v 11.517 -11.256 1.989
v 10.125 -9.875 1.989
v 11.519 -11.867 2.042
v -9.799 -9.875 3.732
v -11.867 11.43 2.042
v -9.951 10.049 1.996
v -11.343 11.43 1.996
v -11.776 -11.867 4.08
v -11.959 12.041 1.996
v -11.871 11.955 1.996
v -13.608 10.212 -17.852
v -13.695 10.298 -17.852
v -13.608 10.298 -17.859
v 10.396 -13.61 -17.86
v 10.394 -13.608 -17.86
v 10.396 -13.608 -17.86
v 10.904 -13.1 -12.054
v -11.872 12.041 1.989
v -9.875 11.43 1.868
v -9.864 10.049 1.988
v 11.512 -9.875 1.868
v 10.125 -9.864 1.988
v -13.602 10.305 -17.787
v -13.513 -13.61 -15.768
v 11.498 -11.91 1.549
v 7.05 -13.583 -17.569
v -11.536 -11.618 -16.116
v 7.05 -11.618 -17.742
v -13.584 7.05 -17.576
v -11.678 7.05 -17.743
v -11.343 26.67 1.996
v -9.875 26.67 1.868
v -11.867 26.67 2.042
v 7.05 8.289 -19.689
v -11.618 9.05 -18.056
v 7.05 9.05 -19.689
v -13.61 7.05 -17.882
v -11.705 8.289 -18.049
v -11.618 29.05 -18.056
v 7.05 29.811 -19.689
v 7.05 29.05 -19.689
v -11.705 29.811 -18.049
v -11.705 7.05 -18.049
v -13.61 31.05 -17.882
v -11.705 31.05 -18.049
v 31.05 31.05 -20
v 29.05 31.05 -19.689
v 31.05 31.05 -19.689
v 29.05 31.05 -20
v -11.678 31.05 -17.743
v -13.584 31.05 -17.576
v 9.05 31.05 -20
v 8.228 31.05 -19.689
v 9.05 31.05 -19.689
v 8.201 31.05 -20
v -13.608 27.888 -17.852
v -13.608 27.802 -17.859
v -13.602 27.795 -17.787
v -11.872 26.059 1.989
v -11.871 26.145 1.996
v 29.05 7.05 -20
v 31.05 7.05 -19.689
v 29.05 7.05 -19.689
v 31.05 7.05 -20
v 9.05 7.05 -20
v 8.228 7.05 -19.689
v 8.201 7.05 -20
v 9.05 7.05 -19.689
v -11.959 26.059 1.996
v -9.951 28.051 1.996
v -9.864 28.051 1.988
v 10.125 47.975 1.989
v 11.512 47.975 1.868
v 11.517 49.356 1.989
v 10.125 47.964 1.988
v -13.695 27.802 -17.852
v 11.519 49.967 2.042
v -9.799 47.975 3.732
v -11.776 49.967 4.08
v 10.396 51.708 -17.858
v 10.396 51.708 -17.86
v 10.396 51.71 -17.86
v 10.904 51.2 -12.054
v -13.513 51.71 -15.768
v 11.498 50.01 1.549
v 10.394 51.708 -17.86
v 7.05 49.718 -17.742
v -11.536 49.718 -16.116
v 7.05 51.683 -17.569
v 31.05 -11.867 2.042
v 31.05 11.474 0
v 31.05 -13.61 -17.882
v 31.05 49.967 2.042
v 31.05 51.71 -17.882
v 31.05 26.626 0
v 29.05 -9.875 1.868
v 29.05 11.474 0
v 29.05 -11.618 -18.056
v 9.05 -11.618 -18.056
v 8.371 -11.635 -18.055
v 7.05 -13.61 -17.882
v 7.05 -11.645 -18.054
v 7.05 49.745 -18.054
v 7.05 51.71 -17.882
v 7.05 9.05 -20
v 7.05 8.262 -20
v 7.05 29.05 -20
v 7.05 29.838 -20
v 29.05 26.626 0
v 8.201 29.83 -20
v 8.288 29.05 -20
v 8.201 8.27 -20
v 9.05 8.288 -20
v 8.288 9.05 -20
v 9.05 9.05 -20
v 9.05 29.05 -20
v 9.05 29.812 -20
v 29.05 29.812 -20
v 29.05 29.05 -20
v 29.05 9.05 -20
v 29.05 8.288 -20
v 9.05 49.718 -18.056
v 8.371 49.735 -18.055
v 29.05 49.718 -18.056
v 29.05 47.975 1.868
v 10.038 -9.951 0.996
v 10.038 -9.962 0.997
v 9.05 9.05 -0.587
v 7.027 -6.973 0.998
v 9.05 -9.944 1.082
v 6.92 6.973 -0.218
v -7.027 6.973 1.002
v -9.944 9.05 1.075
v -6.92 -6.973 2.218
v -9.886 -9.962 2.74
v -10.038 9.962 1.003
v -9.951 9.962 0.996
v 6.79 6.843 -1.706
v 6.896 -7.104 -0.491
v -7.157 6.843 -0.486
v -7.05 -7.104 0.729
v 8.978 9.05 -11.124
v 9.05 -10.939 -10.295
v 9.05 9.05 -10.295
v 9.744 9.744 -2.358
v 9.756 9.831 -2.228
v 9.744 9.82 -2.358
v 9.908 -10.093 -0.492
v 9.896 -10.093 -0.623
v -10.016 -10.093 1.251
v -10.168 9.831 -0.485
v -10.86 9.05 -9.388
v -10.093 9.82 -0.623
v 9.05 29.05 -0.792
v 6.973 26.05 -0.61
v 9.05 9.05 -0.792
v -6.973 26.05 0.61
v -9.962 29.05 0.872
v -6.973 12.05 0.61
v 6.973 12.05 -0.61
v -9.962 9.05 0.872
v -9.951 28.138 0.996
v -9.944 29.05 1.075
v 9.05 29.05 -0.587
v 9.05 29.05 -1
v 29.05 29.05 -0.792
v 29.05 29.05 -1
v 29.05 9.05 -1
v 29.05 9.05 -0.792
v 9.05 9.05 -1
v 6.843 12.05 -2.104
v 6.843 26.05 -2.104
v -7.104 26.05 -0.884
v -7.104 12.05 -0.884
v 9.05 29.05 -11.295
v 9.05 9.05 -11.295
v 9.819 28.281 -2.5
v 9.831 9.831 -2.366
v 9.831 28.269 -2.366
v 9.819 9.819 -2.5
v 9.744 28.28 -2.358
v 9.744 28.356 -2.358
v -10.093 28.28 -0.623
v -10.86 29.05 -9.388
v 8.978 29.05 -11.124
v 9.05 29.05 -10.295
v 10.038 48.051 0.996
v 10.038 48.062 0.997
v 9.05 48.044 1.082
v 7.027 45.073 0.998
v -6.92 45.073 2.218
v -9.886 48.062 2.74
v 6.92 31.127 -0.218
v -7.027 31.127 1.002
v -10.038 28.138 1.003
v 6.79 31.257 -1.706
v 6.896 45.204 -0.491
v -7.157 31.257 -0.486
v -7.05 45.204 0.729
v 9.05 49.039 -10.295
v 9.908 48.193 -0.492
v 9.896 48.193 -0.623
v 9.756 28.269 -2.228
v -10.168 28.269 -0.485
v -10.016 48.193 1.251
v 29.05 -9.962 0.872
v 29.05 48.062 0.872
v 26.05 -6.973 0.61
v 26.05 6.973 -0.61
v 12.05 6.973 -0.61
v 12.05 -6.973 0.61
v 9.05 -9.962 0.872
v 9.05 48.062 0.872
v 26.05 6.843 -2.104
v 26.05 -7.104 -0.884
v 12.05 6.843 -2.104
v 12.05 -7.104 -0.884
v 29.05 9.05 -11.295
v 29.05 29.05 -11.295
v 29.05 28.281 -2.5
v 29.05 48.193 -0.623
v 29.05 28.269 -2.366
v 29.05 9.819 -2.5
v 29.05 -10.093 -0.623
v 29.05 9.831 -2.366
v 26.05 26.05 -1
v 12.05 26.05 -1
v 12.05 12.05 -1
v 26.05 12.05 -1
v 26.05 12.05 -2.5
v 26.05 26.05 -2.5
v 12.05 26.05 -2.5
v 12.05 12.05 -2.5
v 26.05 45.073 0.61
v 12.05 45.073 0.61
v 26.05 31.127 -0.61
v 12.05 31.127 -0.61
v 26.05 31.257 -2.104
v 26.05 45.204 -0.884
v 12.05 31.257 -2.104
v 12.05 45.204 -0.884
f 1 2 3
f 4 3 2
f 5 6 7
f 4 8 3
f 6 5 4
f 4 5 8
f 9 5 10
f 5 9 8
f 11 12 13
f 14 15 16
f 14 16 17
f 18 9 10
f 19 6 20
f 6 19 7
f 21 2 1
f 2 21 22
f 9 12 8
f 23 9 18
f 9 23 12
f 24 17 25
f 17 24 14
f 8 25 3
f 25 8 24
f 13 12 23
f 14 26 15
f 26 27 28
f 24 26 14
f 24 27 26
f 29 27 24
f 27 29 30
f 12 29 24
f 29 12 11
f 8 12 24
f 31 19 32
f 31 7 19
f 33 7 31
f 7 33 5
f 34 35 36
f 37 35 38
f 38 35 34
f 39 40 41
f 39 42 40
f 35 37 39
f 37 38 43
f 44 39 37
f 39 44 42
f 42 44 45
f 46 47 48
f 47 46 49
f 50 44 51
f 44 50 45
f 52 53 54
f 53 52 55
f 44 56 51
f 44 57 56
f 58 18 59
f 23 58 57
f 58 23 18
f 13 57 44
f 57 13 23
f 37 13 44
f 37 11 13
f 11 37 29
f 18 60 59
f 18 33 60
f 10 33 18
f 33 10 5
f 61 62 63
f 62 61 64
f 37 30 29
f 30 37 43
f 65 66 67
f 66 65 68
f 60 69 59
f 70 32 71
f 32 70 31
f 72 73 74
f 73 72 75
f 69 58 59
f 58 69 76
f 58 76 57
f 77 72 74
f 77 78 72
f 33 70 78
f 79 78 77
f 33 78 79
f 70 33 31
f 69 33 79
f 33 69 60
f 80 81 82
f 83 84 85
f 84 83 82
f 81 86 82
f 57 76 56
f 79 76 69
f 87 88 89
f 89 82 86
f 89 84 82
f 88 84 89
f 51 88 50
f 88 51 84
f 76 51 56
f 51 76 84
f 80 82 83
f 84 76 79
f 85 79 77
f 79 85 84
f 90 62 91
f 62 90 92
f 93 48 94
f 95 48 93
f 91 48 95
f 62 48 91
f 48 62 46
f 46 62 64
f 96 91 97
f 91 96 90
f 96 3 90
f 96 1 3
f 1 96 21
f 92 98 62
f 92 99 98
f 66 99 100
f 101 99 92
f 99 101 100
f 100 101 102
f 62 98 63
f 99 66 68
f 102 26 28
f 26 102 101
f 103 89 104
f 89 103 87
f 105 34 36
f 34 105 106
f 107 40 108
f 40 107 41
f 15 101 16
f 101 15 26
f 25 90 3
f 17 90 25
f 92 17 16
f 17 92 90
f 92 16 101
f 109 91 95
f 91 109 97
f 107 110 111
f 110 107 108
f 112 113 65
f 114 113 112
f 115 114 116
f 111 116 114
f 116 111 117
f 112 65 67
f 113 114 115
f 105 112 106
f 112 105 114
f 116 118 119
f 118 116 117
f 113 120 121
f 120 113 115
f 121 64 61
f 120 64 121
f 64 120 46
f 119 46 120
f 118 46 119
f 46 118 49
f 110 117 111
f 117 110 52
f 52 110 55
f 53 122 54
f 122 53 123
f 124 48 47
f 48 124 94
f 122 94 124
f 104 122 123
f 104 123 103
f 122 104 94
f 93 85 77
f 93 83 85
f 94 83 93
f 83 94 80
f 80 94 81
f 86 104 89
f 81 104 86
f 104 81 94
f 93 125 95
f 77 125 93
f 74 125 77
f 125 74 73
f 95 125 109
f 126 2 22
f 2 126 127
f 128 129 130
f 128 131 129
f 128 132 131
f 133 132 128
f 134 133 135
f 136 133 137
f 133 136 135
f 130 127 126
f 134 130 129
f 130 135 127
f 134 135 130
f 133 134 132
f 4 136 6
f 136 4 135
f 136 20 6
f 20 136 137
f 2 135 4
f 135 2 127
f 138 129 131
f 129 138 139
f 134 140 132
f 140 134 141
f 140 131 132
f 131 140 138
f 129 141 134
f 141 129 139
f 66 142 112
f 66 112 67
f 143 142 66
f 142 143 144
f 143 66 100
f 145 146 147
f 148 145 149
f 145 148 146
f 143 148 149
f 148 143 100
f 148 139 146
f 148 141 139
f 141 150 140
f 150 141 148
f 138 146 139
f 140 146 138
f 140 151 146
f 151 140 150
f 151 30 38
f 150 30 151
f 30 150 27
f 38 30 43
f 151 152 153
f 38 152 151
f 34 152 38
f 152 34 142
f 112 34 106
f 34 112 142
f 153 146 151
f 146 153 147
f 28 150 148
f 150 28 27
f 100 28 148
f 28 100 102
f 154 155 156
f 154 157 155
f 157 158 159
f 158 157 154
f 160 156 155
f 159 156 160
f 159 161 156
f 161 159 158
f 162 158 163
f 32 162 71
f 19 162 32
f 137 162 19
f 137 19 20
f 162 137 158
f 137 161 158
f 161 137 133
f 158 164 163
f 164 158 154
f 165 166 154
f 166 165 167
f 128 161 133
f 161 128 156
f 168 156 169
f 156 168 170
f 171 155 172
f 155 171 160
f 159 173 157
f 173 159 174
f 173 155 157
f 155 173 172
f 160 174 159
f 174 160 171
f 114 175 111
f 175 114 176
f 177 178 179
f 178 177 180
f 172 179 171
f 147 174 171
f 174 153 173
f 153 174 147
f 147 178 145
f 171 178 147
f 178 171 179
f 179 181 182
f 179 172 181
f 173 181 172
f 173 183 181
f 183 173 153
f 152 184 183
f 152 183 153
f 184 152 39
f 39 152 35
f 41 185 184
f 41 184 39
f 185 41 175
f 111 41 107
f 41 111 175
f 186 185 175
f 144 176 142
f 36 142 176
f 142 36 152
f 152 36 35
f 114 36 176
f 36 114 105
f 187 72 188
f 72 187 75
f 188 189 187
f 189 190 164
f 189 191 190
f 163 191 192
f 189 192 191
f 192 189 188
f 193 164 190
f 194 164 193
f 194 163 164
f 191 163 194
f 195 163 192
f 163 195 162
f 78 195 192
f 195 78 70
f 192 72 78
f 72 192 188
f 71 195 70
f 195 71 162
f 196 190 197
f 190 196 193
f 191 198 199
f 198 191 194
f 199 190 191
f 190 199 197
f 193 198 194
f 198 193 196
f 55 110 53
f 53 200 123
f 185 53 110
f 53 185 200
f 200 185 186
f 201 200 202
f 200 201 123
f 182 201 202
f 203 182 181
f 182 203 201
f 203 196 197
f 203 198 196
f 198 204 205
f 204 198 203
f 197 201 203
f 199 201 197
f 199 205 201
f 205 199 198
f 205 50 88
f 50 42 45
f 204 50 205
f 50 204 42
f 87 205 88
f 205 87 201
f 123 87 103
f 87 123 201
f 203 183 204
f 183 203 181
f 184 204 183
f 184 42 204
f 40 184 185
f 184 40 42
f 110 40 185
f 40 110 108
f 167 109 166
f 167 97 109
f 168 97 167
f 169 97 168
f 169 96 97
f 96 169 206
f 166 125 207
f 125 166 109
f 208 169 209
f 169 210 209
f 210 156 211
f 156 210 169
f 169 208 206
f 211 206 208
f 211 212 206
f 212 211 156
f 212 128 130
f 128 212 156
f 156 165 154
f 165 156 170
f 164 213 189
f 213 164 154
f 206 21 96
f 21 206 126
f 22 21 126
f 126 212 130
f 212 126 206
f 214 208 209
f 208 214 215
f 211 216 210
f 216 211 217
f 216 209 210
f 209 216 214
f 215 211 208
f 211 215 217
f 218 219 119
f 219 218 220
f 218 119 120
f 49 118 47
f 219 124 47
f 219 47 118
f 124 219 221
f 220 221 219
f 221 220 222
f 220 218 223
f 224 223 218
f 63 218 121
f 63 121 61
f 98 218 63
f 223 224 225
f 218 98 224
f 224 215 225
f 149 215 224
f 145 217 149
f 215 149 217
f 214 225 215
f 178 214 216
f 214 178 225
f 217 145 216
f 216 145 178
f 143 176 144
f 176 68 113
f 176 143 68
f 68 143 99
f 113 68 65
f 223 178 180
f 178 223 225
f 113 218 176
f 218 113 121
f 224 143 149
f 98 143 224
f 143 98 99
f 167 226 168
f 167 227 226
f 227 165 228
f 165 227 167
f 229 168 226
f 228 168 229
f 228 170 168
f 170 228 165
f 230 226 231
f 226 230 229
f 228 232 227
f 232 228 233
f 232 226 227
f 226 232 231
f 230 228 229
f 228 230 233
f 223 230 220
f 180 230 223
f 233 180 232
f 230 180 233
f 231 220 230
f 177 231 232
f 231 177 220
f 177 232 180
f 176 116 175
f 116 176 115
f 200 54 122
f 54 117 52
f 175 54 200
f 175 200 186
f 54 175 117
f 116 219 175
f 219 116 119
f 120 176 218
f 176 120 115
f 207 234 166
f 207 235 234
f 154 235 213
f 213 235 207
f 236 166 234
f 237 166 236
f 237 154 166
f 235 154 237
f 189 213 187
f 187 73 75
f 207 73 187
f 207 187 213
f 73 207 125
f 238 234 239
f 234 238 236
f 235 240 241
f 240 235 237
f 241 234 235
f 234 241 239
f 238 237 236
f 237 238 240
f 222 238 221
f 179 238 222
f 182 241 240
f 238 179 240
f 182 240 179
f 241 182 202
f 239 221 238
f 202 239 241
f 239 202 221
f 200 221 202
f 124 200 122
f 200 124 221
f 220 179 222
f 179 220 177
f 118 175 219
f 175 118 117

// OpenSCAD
// Generated by SolidPython 1.1.3 on 2024-12-14 22:49:23


difference() {
	union() {
		translate(v = [0.0000000000, 0.0000000000, 1]) {
			rotate(a = [-5, 5, 0]) {
				translate(v = [-12, -12, -19]) {
					cube(size = [24, 24, 20]);
				}
			}
		}
		translate(v = [0.0000000000, 19.0500000000, 0]) {
			rotate(a = [0, 5, 0]) {
				translate(v = [-12, -12, -19]) {
					cube(size = [24, 24, 20]);
				}
			}
		}
		translate(v = [0.0000000000, 38.1000000000, 1]) {
			rotate(a = [5, 5, 0]) {
				translate(v = [-12, -12, -19]) {
					cube(size = [24, 24, 20]);
				}
			}
		}
		translate(v = [19.0500000000, 0.0000000000, 0]) {
			rotate(a = [-5, 0, 0]) {
				translate(v = [-12, -12, -19]) {
					cube(size = [24, 24, 20]);
				}
			}
		}
		translate(v = [19.0500000000, 19.0500000000, -1]) {
			rotate(a = [0, 0, 0]) {
				translate(v = [-12, -12, -19]) {
					cube(size = [24, 24, 20]);
				}
			}
		}
		translate(v = [19.0500000000, 38.1000000000, 0]) {
			rotate(a = [5, 0, 0]) {
				translate(v = [-12, -12, -19]) {
					cube(size = [24, 24, 20]);
				}
			}
		}
	}
	union() {
		translate(v = [0.0000000000, 0.0000000000, 1]) {
			rotate(a = [-5, 5, 0]) {
				union() {
					translate(v = [-10, -10, 0]) {
						cube(size = [20, 20, 10]);
					}
					translate(v = [-7, -7, -49]) {
						cube(size = [14, 14, 50]);
					}
					translate(v = [-10, -10, -51.5000000000]) {
						cube(size = [20, 20, 50]);
					}
				}
			}
		}
		translate(v = [0.0000000000, 19.0500000000, 0]) {
			rotate(a = [0, 5, 0]) {
				union() {
					translate(v = [-10, -10, 0]) {
						cube(size = [20, 20, 10]);
					}
					translate(v = [-7, -7, -49]) {
						cube(size = [14, 14, 50]);
					}
					translate(v = [-10, -10, -51.5000000000]) {
						cube(size = [20, 20, 50]);
					}
				}
			}
		}
		translate(v = [0.0000000000, 38.1000000000, 1]) {
			rotate(a = [5, 5, 0]) {
				union() {
					translate(v = [-10, -10, 0]) {
						cube(size = [20, 20, 10]);
					}
					translate(v = [-7, -7, -49]) {
						cube(size = [14, 14, 50]);
					}
					translate(v = [-10, -10, -51.5000000000]) {
						cube(size = [20, 20, 50]);
					}
				}
			}
		}
		translate(v = [19.0500000000, 0.0000000000, 0]) {
			rotate(a = [-5, 0, 0]) {
				union() {
					translate(v = [-10, -10, 0]) {
						cube(size = [20, 20, 10]);
					}
					translate(v = [-7, -7, -49]) {
						cube(size = [14, 14, 50]);
					}
					translate(v = [-10, -10, -51.5000000000]) {
						cube(size = [20, 20, 50]);
					}
				}
			}
		}
		translate(v = [19.0500000000, 19.0500000000, -1]) {
			rotate(a = [0, 0, 0]) {
				union() {
					translate(v = [-10, -10, 0]) {
						cube(size = [20, 20, 10]);
					}
					translate(v = [-7, -7, -49]) {
						cube(size = [14, 14, 50]);
					}
					translate(v = [-10, -10, -51.5000000000]) {
						cube(size = [20, 20, 50]);
					}
				}
			}
		}
		translate(v = [19.0500000000, 38.1000000000, 0]) {
			rotate(a = [5, 0, 0]) {
				union() {
					translate(v = [-10, -10, 0]) {
						cube(size = [20, 20, 10]);
					}
					translate(v = [-7, -7, -49]) {
						cube(size = [14, 14, 50]);
					}
					translate(v = [-10, -10, -51.5000000000]) {
						cube(size = [20, 20, 50]);
					}
				}
			}
		}
	}
}
/***********************************************
*********      SolidPython code:      **********
************************************************
 
from solid import *

# ケースになる部分
body = translate([-12, -12, -19])(
    cube([24, 24, 20])
)

# ケースからカットする部分
hole = union()(
    # スイッチの上側をカットする部分
    translate([-10, -10, 0])(
        cube([20, 20, 10])
    ),
    # スイッチの穴
    translate([-7, -7, -49])(
        cube([14, 14, 50])
    ),
    # スイッチプレートの下側
    translate([-10, -10, -51.5])(
        cube([20, 20, 50])
    ),
)

# スイッチの位置 x, y, z と角度[度] rx, ry
position = [
    [19.05 * 0, 19.05 * 0,  1, -5, 5],
    [19.05 * 0, 19.05 * 1,  0,  0, 5],
    [19.05 * 0, 19.05 * 2,  1,  5, 5],
    [19.05 * 1, 19.05 * 0,  0, -5, 0],
    [19.05 * 1, 19.05 * 1, -1,  0, 0],
    [19.05 * 1, 19.05 * 2,  0,  5, 0],
]

# ケースを合体
case6 = union()(
    [
        translate([x, y, z])(
            rotate([rx, ry, 0])(body)
        ) for x, y, z, rx, ry in position
    ]
)

# カット部分を合体
hole6 = union()(
    [
        translate([x, y, z])(
            rotate([rx, ry, 0])(hole)
        ) for x, y, z, rx, ry in position
    ]
)

# ケースの底を平らにカットするための立方体
bottom = translate([-20, -20, -29])(
  cube([100, 100, 20])
)

# ケースからカット部分を引く
kbd = difference()(
  case6,
  hole6,
)

scad_render_to_file(kbd, '6_6keys-rot.scad')
 
 
************************************************/
